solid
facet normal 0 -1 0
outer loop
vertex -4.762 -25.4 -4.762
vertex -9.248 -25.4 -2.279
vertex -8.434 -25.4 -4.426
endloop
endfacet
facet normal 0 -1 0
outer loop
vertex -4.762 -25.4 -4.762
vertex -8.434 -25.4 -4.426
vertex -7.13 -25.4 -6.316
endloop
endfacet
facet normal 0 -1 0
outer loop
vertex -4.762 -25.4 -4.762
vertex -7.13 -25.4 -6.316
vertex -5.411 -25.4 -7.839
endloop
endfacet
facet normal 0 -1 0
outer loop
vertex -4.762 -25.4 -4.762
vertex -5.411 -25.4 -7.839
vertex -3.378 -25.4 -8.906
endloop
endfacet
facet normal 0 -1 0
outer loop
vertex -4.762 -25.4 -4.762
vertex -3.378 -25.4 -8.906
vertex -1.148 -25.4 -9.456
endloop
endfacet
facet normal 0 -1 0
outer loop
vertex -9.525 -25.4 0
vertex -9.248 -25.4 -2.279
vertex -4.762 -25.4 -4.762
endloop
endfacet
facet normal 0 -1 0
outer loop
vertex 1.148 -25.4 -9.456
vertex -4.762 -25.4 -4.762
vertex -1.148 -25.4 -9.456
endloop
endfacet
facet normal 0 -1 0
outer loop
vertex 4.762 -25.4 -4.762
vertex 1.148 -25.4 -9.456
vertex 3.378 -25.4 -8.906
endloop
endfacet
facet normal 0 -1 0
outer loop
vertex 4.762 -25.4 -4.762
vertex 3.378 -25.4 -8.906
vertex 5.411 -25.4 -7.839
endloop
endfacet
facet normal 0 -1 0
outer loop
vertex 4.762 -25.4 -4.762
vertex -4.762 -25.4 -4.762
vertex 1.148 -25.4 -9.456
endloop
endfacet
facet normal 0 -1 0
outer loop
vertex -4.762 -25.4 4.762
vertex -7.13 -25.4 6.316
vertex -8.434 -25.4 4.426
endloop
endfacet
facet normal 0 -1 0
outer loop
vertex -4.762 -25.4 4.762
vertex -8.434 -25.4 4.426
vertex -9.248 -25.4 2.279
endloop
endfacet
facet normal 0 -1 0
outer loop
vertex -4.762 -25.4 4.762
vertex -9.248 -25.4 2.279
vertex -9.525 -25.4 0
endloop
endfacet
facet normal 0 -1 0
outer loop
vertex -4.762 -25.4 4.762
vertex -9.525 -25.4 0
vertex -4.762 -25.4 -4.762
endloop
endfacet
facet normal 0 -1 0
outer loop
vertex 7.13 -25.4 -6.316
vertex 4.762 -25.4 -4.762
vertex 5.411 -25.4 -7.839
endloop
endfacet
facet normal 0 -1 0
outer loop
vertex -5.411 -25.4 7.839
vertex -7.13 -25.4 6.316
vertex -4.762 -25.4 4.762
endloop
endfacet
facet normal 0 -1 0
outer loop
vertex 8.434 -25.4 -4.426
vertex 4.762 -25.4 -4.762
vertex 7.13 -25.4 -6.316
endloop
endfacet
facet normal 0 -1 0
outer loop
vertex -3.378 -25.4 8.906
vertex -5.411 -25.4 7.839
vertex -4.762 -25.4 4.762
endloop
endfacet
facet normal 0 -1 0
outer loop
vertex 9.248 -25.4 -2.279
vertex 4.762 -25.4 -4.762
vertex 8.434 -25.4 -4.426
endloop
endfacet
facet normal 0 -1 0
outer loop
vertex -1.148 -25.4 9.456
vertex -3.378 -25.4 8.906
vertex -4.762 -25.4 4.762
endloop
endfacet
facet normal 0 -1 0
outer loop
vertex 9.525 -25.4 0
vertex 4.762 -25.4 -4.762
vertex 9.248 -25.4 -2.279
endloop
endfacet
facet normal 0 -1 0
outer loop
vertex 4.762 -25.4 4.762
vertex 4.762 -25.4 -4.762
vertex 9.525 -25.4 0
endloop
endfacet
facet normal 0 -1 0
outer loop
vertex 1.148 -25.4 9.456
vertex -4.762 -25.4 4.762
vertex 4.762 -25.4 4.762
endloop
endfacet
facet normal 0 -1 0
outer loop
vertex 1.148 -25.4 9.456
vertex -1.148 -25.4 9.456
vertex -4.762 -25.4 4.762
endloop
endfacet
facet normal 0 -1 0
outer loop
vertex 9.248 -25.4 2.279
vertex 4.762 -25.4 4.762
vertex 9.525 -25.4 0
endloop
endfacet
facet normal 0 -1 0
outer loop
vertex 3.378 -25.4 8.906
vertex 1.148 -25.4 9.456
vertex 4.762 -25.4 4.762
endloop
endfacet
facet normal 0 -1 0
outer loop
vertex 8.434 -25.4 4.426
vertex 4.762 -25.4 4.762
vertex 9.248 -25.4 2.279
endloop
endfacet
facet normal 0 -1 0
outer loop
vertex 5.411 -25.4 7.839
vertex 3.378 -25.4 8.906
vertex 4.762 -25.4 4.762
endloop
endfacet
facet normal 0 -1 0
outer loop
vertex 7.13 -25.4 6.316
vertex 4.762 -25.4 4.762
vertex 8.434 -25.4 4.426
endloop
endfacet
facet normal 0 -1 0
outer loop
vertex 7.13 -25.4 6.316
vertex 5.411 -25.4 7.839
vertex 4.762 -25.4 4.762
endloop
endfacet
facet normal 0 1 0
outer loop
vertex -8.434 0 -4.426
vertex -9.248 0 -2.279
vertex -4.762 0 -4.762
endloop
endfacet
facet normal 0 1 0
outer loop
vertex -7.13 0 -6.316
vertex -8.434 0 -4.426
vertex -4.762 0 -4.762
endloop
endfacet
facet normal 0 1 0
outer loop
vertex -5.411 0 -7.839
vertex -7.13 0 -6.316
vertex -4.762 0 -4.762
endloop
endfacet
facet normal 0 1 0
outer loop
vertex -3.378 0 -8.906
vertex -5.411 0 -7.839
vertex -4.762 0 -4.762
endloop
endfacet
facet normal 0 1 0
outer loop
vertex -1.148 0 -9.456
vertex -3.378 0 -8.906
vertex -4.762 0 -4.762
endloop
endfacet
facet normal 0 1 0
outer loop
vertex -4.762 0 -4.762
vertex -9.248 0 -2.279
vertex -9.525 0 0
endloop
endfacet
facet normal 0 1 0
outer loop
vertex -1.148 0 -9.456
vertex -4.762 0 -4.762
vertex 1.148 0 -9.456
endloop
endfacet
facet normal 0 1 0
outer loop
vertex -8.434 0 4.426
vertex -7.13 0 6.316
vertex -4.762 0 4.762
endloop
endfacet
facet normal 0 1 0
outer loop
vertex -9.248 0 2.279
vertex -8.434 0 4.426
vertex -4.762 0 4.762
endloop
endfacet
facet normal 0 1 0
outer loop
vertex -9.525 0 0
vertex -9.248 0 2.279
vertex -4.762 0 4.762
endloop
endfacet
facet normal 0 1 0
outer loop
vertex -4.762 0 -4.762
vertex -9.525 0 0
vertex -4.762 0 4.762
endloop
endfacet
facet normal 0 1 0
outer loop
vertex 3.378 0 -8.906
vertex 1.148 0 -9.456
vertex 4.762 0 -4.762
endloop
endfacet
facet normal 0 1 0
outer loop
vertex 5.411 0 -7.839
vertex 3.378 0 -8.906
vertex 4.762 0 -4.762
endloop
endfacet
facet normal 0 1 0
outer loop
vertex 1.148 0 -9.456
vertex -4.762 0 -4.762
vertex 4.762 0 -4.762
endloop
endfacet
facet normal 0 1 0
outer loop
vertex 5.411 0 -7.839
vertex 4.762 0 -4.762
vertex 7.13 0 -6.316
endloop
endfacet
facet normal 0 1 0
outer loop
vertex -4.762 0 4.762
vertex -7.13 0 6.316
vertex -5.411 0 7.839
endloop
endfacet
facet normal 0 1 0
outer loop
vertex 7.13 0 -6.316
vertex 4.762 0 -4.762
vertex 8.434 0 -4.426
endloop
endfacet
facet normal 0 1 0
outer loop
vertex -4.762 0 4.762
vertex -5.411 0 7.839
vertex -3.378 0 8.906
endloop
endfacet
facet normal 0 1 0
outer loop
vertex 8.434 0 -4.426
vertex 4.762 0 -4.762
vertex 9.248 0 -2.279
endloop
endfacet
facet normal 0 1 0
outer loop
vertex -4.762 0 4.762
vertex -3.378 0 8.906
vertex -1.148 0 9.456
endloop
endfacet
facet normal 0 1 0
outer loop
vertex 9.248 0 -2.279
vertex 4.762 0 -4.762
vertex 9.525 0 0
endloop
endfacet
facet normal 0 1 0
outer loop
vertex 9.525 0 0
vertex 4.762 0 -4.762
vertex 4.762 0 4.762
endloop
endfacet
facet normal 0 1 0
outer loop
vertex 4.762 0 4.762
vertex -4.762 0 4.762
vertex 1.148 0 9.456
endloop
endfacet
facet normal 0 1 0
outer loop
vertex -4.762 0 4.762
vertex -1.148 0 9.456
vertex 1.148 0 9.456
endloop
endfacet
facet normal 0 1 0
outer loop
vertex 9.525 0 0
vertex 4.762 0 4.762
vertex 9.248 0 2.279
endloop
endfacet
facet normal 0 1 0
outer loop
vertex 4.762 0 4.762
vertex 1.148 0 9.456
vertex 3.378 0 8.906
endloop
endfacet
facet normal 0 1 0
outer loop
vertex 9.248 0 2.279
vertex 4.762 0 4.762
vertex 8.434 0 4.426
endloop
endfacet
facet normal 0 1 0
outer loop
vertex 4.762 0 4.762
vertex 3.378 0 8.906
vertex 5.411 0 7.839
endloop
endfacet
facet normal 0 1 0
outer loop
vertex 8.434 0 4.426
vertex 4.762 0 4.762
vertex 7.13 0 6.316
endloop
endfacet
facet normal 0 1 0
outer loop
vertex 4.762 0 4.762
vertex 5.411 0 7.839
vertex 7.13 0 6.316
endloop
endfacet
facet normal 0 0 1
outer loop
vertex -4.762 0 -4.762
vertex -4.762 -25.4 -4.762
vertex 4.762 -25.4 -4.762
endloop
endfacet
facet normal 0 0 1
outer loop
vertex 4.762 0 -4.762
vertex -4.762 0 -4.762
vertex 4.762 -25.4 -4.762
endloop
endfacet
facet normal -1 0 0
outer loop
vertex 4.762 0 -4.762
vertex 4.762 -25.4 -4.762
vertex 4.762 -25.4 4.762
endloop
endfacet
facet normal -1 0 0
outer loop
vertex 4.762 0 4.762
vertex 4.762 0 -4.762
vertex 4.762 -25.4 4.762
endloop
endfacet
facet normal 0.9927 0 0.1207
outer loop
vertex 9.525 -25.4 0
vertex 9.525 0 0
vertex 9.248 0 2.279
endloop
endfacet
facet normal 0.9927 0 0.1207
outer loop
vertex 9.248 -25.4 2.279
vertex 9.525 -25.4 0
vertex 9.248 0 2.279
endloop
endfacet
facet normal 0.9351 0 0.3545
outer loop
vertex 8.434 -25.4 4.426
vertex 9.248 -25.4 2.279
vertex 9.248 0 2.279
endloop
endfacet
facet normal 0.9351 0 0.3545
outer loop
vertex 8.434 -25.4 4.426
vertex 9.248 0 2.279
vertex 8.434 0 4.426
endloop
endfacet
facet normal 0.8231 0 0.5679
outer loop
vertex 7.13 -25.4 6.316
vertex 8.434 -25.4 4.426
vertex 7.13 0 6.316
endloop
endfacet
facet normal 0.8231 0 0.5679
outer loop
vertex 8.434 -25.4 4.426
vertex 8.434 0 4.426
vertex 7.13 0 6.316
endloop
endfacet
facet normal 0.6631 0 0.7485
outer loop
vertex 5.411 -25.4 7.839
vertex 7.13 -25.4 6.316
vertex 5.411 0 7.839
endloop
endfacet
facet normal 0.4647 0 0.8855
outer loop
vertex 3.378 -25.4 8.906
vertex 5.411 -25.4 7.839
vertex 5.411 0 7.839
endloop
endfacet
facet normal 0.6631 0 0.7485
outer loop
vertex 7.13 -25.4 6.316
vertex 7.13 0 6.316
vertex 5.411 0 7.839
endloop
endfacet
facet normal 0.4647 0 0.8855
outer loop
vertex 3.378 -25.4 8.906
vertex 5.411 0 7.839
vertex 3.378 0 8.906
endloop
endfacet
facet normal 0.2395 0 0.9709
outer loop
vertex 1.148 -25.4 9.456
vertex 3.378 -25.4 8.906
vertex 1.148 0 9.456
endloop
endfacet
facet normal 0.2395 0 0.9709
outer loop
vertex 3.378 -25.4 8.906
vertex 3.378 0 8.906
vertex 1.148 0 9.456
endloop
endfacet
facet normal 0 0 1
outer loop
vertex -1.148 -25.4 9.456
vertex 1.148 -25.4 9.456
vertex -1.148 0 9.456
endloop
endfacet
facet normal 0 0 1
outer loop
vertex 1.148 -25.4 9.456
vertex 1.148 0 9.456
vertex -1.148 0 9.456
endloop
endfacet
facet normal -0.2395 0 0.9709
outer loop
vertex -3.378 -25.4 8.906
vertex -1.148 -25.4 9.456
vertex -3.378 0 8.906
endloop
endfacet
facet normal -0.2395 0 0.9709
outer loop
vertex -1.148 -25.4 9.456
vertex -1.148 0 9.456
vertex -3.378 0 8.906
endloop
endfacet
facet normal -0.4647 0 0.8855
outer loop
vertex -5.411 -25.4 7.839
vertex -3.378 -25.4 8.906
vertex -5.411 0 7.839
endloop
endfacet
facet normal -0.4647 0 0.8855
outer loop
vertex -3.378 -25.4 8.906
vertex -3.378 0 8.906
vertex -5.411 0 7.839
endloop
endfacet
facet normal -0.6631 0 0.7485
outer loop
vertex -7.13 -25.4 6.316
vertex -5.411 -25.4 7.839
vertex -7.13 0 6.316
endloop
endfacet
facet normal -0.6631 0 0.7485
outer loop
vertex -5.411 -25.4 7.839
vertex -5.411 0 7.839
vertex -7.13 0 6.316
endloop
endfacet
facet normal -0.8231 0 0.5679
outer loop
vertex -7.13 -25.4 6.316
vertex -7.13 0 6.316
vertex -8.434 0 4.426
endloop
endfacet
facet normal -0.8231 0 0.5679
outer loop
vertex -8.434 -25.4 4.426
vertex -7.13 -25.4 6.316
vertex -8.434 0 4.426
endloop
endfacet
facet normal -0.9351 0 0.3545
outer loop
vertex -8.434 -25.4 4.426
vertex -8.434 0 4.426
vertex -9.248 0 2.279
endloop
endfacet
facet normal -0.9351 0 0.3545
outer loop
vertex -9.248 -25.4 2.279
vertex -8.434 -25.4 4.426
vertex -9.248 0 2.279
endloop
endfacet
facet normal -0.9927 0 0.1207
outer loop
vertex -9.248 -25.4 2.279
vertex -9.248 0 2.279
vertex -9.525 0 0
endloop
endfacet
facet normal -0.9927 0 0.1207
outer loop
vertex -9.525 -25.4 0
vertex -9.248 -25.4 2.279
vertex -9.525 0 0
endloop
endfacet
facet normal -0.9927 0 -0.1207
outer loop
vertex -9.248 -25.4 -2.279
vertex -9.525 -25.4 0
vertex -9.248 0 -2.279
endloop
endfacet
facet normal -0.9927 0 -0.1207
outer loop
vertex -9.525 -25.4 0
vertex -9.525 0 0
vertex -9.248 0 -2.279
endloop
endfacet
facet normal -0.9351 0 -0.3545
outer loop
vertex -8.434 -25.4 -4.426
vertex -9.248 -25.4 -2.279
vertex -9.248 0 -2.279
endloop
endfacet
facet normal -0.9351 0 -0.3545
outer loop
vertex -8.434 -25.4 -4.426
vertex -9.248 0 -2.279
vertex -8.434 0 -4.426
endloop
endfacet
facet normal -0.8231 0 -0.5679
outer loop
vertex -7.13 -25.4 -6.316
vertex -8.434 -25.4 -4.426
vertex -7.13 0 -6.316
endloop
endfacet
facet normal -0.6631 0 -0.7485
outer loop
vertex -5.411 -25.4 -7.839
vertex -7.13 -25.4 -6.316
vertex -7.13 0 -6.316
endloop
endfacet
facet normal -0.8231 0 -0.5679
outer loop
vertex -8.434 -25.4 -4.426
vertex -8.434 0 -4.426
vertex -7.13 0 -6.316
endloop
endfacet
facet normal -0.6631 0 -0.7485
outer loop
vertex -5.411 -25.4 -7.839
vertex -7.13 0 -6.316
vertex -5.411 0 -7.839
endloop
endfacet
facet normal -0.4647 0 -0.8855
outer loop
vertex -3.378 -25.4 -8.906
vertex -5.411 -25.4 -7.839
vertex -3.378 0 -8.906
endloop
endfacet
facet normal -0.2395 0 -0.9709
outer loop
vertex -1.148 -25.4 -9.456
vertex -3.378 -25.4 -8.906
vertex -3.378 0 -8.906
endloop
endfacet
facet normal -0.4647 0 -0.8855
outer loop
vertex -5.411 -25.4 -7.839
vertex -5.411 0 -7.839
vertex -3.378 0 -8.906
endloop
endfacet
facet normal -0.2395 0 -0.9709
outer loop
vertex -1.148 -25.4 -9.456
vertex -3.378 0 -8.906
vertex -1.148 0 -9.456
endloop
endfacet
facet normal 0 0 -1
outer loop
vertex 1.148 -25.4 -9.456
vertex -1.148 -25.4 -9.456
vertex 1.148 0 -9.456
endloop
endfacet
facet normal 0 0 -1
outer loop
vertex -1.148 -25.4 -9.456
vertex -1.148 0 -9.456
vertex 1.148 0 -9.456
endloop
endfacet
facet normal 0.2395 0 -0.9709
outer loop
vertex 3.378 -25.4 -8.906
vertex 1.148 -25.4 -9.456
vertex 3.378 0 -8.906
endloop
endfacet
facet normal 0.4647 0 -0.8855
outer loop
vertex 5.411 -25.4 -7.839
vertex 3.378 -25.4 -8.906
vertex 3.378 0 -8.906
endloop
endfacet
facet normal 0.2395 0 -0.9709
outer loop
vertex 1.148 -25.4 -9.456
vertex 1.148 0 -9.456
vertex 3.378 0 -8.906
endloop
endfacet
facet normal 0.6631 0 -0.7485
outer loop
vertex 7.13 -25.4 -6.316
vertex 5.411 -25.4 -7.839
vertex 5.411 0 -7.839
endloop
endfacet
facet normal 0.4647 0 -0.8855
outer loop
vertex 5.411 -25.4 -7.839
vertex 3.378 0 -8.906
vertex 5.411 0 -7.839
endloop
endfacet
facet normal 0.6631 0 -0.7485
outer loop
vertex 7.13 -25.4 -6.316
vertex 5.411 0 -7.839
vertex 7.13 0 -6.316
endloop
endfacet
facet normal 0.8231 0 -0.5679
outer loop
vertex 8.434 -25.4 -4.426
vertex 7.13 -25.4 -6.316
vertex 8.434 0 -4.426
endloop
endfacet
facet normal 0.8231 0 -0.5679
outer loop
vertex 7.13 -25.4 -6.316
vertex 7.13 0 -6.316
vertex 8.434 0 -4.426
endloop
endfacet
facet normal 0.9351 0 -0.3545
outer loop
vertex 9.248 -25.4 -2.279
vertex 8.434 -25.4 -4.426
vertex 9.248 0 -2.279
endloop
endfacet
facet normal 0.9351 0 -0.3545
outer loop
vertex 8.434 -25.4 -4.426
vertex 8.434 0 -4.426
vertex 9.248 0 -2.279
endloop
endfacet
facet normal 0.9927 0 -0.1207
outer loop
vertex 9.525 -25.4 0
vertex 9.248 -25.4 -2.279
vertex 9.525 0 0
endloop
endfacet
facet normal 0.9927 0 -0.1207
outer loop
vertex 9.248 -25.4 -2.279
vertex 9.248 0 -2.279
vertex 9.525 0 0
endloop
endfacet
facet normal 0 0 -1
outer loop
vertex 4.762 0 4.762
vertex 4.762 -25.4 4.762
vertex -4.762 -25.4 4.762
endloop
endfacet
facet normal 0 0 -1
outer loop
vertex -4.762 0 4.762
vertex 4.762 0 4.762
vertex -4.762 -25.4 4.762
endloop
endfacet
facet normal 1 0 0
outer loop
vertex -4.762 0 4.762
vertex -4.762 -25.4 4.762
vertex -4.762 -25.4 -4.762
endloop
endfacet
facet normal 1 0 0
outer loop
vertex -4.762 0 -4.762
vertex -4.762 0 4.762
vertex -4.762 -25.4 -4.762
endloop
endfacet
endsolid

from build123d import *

# Parameters (mm, degrees)
F0_R     = 9.525
F1_DEPTH = 25.4
F3_DEPTH = 25.401
F4_DEPTH = 25.4


with BuildPart() as f1:
    # F0 (on Front) → F1 (new body)
    with BuildSketch(Plane.XZ):
        Circle(F0_R)
    extrude(amount=F1_DEPTH)

    # F2 (on face) → F3 (cut, through all)
    with BuildSketch(Plane.XZ.offset(25.4)):
        with BuildLine():
            ThreePointArc((4.7625, 0), (3.367596, 3.367596), (0, 4.7625))
            ThreePointArc((0, 4.7625), (-3.367596, 3.367596), (-4.7625, 0))
            ThreePointArc((-4.7625, 0), (-3.367596, -3.367596), (0, -4.7625))
            ThreePointArc((0, -4.7625), (3.367596, -3.367596), (4.7625, 0))
        make_face()
    extrude(amount=-F3_DEPTH, mode=Mode.SUBTRACT)

    # F2 (on face) → F4 (cut)
    with BuildSketch(Plane.XZ.offset(25.4)):
        with BuildLine():
            Line((4.7625, 0), (4.7625, 4.7625))
            Line((4.7625, 4.7625), (0, 4.7625))
            ThreePointArc((0, 4.7625), (3.367596, 3.367596), (4.7625, 0))
        make_face()
        with BuildLine():
            ThreePointArc((-4.7625, 0), (-3.367596, 3.367596), (0, 4.7625))
            Line((0, 4.7625), (-4.7625, 4.7625))
            Line((-4.7625, 4.7625), (-4.7625, 0))
        make_face()
        with BuildLine():
            Line((4.7625, -4.7625), (4.7625, 0))
            ThreePointArc((4.7625, 0), (3.367596, -3.367596), (0, -4.7625))
            Line((0, -4.7625), (4.7625, -4.7625))
        make_face()
        with BuildLine():
            ThreePointArc((0, -4.7625), (-3.367596, -3.367596), (-4.7625, 0))
            Line((-4.7625, 0), (-4.7625, -4.7625))
            Line((-4.7625, -4.7625), (0, -4.7625))
        make_face()
    extrude(amount=-F4_DEPTH, mode=Mode.SUBTRACT)


solid = f1.part
